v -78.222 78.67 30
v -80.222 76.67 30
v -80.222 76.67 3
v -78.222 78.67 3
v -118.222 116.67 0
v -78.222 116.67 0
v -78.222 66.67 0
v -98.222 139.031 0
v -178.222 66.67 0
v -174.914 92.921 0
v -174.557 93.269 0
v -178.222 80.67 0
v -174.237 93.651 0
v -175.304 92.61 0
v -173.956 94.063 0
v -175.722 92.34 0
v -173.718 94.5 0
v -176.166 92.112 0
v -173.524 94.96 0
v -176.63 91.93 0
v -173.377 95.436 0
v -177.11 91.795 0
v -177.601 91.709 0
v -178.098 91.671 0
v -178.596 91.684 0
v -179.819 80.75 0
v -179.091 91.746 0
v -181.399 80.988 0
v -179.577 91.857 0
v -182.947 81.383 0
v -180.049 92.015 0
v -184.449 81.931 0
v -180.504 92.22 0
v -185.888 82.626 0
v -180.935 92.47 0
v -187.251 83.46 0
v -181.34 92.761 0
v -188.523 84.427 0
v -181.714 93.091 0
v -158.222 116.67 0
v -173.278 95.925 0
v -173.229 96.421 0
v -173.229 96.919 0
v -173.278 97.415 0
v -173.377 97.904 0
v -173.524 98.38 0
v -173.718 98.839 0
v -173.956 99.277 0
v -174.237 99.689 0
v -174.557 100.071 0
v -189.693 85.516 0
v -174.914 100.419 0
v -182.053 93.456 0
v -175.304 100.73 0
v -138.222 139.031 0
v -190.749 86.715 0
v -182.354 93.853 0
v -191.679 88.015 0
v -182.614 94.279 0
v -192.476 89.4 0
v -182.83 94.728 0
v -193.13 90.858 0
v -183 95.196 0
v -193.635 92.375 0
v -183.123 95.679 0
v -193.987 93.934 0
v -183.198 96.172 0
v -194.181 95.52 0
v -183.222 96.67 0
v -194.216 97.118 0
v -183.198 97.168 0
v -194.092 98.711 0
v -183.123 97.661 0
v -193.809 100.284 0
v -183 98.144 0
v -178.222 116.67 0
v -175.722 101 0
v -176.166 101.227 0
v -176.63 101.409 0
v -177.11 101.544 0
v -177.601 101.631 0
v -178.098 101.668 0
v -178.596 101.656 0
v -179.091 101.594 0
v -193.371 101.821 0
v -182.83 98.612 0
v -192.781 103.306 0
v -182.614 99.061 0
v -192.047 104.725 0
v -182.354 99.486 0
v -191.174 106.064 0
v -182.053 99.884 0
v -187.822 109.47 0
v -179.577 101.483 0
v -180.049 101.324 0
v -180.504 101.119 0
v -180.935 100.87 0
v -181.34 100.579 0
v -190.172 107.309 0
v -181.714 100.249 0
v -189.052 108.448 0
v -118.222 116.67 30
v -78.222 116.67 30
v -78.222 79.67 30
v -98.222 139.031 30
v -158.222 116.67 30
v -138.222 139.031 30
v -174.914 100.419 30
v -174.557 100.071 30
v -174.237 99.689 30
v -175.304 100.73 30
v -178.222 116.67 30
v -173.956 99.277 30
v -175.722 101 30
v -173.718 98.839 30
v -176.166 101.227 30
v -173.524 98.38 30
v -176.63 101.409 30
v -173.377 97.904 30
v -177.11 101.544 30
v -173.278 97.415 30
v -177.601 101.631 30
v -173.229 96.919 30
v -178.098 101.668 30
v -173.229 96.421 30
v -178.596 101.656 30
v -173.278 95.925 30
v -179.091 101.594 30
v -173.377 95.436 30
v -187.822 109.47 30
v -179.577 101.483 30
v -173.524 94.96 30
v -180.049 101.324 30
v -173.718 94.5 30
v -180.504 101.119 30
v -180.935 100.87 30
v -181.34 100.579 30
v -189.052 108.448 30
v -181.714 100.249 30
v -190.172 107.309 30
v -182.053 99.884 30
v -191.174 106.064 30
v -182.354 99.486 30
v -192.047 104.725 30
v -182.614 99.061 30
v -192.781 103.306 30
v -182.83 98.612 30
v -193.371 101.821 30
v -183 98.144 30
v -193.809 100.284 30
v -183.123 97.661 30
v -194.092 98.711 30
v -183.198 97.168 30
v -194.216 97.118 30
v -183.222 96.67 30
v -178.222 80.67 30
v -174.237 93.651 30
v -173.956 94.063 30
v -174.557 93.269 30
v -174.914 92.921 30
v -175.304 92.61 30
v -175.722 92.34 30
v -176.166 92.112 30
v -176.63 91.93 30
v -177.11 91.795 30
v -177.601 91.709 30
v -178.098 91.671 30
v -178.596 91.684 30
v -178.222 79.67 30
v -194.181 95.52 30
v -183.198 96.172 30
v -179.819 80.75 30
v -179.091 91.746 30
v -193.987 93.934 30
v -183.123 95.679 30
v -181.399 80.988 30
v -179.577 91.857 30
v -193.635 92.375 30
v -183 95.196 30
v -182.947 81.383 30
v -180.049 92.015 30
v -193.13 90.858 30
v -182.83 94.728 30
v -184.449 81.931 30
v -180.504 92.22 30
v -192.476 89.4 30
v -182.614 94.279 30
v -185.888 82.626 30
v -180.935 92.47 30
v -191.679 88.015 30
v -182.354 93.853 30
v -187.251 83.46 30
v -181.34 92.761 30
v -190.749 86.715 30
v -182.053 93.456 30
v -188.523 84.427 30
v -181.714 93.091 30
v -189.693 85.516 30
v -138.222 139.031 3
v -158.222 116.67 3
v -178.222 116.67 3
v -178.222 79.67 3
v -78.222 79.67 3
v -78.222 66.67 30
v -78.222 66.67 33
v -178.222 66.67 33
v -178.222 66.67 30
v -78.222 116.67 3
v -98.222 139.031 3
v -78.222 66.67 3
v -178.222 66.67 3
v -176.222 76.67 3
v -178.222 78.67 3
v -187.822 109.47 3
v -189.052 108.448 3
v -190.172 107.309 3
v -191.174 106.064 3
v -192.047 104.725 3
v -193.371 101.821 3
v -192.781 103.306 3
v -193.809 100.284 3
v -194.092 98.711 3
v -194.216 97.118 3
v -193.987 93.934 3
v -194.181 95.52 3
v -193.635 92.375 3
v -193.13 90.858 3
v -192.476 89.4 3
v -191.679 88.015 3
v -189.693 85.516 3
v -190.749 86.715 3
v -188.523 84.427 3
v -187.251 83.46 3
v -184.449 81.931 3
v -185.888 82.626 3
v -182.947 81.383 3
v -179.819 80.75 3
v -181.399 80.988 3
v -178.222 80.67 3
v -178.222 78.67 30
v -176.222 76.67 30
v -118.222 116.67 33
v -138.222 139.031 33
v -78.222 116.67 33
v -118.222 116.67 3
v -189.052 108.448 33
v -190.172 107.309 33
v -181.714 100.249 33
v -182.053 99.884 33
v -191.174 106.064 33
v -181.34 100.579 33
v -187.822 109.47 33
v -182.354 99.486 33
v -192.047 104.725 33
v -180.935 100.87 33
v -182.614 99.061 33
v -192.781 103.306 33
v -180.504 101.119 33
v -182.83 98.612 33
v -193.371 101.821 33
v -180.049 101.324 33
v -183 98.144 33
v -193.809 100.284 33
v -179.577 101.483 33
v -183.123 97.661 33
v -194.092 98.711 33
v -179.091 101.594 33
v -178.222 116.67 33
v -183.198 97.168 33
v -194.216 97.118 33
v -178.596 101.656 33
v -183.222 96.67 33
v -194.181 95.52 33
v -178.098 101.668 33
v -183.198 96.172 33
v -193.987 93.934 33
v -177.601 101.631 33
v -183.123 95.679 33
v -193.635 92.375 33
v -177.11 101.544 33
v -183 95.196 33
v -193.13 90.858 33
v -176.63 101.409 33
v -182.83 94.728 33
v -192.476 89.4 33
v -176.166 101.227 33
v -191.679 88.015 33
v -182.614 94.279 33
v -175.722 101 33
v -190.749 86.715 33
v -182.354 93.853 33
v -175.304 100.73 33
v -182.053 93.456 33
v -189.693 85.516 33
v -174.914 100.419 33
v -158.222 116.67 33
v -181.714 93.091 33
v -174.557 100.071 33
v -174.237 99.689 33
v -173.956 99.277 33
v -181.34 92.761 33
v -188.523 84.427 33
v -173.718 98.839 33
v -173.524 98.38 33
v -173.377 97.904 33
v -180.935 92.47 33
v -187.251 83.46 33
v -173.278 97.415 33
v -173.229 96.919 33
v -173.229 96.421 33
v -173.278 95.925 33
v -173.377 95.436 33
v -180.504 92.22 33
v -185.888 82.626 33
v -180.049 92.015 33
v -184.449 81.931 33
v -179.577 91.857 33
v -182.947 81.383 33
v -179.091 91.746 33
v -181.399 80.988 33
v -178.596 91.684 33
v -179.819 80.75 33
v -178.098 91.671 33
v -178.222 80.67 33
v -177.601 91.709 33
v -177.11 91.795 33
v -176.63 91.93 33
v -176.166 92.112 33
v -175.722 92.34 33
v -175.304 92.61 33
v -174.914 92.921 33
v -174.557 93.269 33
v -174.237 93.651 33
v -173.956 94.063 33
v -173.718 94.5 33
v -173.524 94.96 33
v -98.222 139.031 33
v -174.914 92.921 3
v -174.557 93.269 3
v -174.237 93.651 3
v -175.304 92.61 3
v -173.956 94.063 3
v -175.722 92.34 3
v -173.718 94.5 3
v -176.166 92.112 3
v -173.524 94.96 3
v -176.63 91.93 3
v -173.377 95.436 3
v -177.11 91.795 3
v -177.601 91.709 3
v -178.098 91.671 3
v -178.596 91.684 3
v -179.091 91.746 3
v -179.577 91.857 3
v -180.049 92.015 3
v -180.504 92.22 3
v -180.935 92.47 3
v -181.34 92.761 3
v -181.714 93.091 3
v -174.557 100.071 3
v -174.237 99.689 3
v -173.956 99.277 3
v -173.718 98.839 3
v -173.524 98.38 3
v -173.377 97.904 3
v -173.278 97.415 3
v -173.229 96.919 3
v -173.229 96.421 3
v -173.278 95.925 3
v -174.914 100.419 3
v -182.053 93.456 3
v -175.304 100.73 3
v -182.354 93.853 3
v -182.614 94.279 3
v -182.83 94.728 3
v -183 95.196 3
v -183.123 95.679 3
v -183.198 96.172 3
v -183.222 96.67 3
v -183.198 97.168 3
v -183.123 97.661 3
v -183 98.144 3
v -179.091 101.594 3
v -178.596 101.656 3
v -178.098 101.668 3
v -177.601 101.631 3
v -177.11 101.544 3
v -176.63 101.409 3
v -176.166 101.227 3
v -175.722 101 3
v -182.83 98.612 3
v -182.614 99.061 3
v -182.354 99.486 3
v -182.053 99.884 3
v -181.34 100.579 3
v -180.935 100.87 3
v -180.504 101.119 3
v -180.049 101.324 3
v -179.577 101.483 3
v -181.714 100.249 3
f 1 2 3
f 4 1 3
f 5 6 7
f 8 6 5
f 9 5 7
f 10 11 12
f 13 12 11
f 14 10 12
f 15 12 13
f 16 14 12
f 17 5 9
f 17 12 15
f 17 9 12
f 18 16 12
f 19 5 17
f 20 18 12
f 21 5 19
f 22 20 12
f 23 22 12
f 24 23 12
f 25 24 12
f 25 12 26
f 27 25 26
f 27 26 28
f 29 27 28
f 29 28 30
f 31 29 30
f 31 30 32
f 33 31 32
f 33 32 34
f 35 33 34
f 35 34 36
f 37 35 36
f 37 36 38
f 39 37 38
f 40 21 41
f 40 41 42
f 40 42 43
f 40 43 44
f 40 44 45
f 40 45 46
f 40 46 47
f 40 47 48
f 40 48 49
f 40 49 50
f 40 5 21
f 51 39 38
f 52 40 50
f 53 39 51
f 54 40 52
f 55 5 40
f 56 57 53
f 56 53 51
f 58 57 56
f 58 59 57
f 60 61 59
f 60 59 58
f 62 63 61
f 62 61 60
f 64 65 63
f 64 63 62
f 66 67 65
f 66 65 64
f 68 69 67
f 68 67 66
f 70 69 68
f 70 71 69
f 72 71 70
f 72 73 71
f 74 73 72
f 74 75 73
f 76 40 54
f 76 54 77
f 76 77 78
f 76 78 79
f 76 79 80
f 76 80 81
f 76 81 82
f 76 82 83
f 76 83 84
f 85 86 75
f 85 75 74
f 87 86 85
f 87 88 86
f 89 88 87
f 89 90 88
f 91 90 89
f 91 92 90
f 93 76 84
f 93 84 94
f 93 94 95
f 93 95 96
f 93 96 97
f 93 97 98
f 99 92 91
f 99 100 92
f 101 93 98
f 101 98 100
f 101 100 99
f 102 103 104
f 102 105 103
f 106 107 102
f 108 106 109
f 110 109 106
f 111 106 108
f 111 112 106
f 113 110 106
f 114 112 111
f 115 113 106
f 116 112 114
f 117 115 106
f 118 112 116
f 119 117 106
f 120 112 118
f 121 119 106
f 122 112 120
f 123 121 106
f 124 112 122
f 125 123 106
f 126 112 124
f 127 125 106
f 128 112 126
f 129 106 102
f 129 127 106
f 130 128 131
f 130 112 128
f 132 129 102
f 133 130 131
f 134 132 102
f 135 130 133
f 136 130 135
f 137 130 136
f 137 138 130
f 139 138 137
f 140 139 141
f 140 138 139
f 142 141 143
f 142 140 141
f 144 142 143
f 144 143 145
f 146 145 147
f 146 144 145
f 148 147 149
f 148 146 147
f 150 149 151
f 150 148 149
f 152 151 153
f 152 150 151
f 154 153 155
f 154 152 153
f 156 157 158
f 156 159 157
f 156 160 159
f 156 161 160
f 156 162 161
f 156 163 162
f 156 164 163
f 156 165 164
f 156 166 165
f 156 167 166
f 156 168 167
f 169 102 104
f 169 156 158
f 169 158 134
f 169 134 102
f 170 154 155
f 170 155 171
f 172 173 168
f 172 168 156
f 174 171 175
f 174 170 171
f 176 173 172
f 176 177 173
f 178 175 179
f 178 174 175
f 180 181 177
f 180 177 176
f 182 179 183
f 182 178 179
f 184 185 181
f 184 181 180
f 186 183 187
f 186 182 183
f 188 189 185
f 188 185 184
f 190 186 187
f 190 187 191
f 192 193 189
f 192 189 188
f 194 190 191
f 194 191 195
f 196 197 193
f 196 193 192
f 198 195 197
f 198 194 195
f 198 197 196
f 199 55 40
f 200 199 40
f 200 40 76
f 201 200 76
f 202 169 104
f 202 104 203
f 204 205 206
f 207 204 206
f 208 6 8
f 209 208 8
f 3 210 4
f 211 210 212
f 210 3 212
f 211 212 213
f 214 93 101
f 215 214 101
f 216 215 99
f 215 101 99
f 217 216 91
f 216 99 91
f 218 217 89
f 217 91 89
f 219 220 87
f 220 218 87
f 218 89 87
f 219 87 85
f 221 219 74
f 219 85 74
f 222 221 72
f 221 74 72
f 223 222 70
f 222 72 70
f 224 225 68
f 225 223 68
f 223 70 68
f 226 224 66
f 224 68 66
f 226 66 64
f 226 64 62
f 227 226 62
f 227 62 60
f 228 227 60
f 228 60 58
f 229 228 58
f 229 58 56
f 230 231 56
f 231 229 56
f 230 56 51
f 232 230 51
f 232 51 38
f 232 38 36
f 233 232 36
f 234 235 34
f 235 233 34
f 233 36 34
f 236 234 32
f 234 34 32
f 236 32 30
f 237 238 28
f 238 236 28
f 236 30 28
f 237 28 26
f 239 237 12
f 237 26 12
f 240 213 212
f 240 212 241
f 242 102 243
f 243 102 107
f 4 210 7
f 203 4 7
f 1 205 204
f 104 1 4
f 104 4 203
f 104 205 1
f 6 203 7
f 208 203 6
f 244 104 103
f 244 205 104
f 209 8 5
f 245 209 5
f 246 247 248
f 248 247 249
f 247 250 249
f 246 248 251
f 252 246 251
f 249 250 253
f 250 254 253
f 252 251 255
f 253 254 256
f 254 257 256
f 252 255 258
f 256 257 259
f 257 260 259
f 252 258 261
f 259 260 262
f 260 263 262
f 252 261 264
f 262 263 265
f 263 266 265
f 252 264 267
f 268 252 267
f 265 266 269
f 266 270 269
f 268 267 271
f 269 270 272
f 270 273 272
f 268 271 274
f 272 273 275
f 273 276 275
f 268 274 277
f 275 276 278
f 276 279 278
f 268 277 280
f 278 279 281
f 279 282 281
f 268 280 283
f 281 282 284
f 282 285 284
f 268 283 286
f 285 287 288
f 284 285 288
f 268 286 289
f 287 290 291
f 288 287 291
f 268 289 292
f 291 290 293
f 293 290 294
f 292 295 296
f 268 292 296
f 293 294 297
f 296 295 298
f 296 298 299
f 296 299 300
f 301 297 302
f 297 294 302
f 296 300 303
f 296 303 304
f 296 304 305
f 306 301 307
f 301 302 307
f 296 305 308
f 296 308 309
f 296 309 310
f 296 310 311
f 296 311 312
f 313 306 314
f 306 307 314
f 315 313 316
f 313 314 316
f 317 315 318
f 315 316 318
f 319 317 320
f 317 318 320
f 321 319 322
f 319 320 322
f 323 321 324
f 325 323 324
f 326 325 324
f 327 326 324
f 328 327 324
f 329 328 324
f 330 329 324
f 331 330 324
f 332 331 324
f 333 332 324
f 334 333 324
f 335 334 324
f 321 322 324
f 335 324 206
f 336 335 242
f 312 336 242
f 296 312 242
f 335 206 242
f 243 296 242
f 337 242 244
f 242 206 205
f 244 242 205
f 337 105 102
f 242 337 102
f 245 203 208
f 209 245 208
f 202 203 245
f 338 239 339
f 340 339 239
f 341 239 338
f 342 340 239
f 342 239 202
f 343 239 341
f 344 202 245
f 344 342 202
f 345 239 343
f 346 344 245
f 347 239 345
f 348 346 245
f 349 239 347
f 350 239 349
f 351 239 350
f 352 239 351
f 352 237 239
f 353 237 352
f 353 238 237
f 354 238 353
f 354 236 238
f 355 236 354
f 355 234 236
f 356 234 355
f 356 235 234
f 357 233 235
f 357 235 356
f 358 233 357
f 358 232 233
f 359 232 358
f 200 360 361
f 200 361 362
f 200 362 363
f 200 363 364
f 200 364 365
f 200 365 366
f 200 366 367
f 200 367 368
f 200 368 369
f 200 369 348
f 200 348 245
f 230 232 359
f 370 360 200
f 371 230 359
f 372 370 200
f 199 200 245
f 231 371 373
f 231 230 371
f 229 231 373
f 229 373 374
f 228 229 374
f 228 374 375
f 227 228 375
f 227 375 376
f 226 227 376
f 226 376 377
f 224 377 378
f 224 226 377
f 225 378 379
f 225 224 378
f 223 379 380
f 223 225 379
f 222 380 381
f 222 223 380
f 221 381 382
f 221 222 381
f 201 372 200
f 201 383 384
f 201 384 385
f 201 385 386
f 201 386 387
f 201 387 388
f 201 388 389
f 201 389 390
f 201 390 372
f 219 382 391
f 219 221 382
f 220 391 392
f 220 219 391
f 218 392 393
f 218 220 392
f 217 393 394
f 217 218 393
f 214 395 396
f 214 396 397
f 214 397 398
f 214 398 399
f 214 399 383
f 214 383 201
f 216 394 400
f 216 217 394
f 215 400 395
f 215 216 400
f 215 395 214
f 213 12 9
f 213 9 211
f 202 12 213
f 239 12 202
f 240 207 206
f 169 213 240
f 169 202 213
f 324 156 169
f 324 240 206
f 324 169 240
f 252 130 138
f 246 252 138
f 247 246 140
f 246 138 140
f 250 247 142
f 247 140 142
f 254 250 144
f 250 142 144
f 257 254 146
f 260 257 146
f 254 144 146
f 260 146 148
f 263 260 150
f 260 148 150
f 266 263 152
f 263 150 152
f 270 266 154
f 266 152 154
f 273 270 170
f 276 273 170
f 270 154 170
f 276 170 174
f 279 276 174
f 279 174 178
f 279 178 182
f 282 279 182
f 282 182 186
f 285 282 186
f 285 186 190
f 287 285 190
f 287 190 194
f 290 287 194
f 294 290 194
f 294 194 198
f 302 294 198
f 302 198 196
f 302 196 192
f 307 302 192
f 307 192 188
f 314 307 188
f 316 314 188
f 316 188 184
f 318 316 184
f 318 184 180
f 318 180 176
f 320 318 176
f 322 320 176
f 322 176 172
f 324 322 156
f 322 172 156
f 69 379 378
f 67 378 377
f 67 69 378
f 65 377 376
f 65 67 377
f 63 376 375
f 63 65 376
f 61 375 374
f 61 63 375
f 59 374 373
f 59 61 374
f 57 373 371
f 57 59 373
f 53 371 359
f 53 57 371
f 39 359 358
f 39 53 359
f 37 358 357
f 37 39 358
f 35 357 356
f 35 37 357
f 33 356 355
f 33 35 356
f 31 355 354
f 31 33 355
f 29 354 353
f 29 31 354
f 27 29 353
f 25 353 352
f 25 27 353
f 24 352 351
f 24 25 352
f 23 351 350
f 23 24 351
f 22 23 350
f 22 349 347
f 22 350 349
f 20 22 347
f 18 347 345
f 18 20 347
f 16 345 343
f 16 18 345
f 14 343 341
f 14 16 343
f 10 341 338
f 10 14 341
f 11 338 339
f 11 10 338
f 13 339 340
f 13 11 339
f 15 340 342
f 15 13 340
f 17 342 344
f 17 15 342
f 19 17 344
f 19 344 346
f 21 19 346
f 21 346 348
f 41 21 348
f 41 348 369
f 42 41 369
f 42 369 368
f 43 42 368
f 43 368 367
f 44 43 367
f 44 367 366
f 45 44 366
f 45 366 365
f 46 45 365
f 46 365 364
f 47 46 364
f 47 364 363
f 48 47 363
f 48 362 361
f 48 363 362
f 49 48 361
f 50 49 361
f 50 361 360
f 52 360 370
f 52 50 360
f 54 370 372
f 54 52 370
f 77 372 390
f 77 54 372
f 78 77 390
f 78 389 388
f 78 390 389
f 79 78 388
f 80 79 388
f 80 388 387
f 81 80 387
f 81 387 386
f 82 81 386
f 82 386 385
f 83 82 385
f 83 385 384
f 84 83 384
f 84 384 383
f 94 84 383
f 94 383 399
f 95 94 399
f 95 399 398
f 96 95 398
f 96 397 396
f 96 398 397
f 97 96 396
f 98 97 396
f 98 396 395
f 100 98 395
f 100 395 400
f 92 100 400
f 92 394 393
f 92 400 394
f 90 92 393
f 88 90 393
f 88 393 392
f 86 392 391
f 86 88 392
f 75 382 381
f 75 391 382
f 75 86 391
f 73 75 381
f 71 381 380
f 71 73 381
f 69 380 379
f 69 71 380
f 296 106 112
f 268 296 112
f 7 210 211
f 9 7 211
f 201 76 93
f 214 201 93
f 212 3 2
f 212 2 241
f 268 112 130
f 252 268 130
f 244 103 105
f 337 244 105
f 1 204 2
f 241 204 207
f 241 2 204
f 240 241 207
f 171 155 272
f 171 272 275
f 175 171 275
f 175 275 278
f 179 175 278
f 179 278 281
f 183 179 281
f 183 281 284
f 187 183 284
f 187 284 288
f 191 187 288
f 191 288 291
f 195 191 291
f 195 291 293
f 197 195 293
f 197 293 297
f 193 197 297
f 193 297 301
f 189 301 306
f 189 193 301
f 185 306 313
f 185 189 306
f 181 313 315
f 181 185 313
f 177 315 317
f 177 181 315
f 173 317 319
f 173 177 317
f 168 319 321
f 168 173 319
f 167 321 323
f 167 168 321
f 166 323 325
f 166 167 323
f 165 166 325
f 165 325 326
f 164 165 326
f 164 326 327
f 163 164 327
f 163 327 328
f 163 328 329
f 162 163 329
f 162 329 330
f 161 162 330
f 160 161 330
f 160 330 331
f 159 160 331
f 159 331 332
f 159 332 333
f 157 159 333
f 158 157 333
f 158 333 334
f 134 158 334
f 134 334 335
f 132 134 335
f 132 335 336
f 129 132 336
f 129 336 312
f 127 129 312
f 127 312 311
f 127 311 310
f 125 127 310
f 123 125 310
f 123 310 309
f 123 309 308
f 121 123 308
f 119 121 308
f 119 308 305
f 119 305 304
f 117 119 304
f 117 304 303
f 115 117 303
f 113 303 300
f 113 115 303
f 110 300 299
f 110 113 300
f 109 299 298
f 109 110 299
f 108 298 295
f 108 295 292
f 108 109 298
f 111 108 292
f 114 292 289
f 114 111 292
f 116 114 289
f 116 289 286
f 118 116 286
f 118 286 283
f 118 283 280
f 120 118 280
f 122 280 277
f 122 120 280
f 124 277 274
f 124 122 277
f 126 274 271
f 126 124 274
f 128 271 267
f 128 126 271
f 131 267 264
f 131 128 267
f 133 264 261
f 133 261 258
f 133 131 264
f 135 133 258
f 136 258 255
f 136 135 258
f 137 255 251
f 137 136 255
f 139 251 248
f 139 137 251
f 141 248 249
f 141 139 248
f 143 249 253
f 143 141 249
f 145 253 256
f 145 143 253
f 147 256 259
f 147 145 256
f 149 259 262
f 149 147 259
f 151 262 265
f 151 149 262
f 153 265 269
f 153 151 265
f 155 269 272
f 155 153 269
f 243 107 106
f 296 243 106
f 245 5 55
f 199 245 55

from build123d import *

# Parameters (mm, degrees)
F0_R      = 5
F1_DEPTH  = 33
F5_W      = 100
F5_H      = 3
F6_DEPTH  = 28
F7_W      = 100
F7_H      = 3
F8_DEPTH  = 10
F7_H_2    = 33
F13_DEPTH = 116.001
F14_W     = 100
F14_H     = 3
F15_DEPTH = 10
F18_DEPTH = 33.001
F21_DEPTH = 33.001
F24_DEPTH = 33.001
F25_SIZE  = 2


with BuildPart() as f1:
    # F0 (on Top) → F1 (new body)
    with BuildSketch(Plane.XY):
        with BuildLine():
            Line((21.777506699, 52.6698508731), (21.777506699, 56.6698508731))
            Line((21.777506699, 56.6698508731), (-78.222493301, 56.6698508731))
            Line((-78.222493301, 56.6698508731), (-78.222493301, 16.6698508731))
            Line((-78.222493301, 16.6698508731), (-58.222493301, -5.6908289019))
            Line((-58.222493301, -5.6908289019), (-38.222493301, 16.6698508731))
            Line((-38.222493301, 16.6698508731), (-18.222493301, -5.6908289019))
            Line((-18.222493301, -5.6908289019), (1.777506699, 16.6698508731))
            Line((1.777506699, 16.6698508731), (21.777506699, 16.6698508731))
            Line((21.777506699, 16.6698508731), (31.377506699, 23.8698508731))
            ThreePointArc((31.377506699, 23.8698508731), (36.9564394679, 41.7294951294), (21.777506699, 52.6698508731))
        make_face()
        with Locations((21.777506699, 36.6698508731)):
            Circle(F0_R, mode=Mode.SUBTRACT)
    extrude(amount=F1_DEPTH)


with BuildPart() as f2_1:
    # F2: copy of F1
    add(f1.part.moved(Location((0, 0, 28))))


with BuildPart() as f4_1:
    # F4: copy of F1
    add(f1.part.moved(Location((0, 0, 34))))


with BuildPart() as f6:
    # F5 (on face) → F6 (new body)
    with BuildSketch(Plane.XY.offset(33)):
        with Locations((-28.222493301, 55.1698508731)):
            Rectangle(F5_W, F5_H)
    extrude(amount=F6_DEPTH)


with BuildPart() as f8:
    # F7 (on face) → F8 (new body)
    with BuildSketch(Plane(origin=(0, 56.6698508731, 0), x_dir=(-1, 0, 0), z_dir=(0, 1, 0))):
        with Locations((28.222493301, 62.5)):
            Rectangle(F7_W, F7_H)
    extrude(amount=F8_DEPTH)


with BuildPart() as f8b:
    # F7 (on face) → F8, piece 2 (new body)
    with BuildSketch(Plane(origin=(0, 56.6698508731, 0), x_dir=(-1, 0, 0), z_dir=(0, 1, 0))):
        with Locations((28.222493301, 16.5)):
            Rectangle(F7_W, F7_H_2)
    extrude(amount=F8_DEPTH)


with BuildPart() as f1_1:
    add(f1.part)

    # F12 (on face) → F13 (cut, through all)
    with BuildSketch(Plane(origin=(-78.222493301, 0, 0), x_dir=(0, -1, 0), z_dir=(-1, 0, 0))):
        Polygon((15.5293103307, 30), (-53.6698508731, 30), (-53.6698508731, 3), (13.7041052803, 3), align=None)
    extrude(amount=-F13_DEPTH, mode=Mode.SUBTRACT)

    # F14 (on face) → F15 (join)
    with BuildSketch(Plane(origin=(0, 56.6698508731, 0), x_dir=(-1, 0, 0), z_dir=(0, 1, 0))):
        with Locations((28.222493301, 1.5)):
            Rectangle(F14_W, F14_H)
        with Locations((28.222493301, 31.5)):
            Rectangle(F14_W, F14_H)
    extrude(amount=F15_DEPTH)

    # F16: F1 across face


with BuildPart() as f1_2:
    add(f1_1.part)
    add(f1_1.part.mirror(Plane(origin=(-78.222493301, 44.5399296132, 16.5), x_dir=(0, -1, 0), z_dir=(-1, 0, 0))))

    # F17 (on face) → F18 (cut, through all)
    with BuildSketch(Plane.XY.offset(33)):
        Polygon((-78.222493301, 86.7001339793), (-78.222493301, 16.6698508731), (-78.222493301, -27.7220606804), (68.2113543153, -27.7220606804), (68.2113543153, 86.7001339793), align=None)
    extrude(amount=-F18_DEPTH, mode=Mode.SUBTRACT)

    # F19: F1 across face


with BuildPart() as f1_3:
    add(f1_2.part)
    add(f1_2.part.mirror(Plane(origin=(-78.222493301, 44.5399296132, 16.5), x_dir=(0, 1, 0), z_dir=(1, 0, 0))))

    # F20 (on face) → F21 (cut, through all)
    with BuildSketch(Plane.XY.offset(33)):
        Polygon((54.2253777385, 66.6698508731), (-78.222493301, 66.6698508731), (-78.222493301, -28.4001789987), (54.2253777385, -31.8515859544), align=None)
    extrude(amount=-F21_DEPTH, mode=Mode.SUBTRACT)

    # F22: F1 across face


with BuildPart() as f1_4:
    add(f1_3.part)
    add(f1_3.part.mirror(Plane(origin=(-128.222493301, 66.6698508731, 31.5), x_dir=(-1, 0, 0), z_dir=(0, 1, 0))))

    # F23 (on face) → F24 (cut, through all)
    with BuildSketch(Plane.XY.offset(33)):
        Polygon((-78.222493301, -18.2117372751), (-78.222493301, 66.6698508731), (-239.6576553583, 66.6698508731), (-202.1560966969, -18.2117372751), align=None)
    extrude(amount=-F24_DEPTH, mode=Mode.SUBTRACT)

    # F25
    f25_edges = [f1_4.edges().sort_by_distance(p)[0] for p in [
        (-178.222493, 76.669851, 16.5),
        (-78.222493, 76.669851, 16.5),
    ]]
    chamfer(f25_edges, length=F25_SIZE)


solid = f1_4.part
